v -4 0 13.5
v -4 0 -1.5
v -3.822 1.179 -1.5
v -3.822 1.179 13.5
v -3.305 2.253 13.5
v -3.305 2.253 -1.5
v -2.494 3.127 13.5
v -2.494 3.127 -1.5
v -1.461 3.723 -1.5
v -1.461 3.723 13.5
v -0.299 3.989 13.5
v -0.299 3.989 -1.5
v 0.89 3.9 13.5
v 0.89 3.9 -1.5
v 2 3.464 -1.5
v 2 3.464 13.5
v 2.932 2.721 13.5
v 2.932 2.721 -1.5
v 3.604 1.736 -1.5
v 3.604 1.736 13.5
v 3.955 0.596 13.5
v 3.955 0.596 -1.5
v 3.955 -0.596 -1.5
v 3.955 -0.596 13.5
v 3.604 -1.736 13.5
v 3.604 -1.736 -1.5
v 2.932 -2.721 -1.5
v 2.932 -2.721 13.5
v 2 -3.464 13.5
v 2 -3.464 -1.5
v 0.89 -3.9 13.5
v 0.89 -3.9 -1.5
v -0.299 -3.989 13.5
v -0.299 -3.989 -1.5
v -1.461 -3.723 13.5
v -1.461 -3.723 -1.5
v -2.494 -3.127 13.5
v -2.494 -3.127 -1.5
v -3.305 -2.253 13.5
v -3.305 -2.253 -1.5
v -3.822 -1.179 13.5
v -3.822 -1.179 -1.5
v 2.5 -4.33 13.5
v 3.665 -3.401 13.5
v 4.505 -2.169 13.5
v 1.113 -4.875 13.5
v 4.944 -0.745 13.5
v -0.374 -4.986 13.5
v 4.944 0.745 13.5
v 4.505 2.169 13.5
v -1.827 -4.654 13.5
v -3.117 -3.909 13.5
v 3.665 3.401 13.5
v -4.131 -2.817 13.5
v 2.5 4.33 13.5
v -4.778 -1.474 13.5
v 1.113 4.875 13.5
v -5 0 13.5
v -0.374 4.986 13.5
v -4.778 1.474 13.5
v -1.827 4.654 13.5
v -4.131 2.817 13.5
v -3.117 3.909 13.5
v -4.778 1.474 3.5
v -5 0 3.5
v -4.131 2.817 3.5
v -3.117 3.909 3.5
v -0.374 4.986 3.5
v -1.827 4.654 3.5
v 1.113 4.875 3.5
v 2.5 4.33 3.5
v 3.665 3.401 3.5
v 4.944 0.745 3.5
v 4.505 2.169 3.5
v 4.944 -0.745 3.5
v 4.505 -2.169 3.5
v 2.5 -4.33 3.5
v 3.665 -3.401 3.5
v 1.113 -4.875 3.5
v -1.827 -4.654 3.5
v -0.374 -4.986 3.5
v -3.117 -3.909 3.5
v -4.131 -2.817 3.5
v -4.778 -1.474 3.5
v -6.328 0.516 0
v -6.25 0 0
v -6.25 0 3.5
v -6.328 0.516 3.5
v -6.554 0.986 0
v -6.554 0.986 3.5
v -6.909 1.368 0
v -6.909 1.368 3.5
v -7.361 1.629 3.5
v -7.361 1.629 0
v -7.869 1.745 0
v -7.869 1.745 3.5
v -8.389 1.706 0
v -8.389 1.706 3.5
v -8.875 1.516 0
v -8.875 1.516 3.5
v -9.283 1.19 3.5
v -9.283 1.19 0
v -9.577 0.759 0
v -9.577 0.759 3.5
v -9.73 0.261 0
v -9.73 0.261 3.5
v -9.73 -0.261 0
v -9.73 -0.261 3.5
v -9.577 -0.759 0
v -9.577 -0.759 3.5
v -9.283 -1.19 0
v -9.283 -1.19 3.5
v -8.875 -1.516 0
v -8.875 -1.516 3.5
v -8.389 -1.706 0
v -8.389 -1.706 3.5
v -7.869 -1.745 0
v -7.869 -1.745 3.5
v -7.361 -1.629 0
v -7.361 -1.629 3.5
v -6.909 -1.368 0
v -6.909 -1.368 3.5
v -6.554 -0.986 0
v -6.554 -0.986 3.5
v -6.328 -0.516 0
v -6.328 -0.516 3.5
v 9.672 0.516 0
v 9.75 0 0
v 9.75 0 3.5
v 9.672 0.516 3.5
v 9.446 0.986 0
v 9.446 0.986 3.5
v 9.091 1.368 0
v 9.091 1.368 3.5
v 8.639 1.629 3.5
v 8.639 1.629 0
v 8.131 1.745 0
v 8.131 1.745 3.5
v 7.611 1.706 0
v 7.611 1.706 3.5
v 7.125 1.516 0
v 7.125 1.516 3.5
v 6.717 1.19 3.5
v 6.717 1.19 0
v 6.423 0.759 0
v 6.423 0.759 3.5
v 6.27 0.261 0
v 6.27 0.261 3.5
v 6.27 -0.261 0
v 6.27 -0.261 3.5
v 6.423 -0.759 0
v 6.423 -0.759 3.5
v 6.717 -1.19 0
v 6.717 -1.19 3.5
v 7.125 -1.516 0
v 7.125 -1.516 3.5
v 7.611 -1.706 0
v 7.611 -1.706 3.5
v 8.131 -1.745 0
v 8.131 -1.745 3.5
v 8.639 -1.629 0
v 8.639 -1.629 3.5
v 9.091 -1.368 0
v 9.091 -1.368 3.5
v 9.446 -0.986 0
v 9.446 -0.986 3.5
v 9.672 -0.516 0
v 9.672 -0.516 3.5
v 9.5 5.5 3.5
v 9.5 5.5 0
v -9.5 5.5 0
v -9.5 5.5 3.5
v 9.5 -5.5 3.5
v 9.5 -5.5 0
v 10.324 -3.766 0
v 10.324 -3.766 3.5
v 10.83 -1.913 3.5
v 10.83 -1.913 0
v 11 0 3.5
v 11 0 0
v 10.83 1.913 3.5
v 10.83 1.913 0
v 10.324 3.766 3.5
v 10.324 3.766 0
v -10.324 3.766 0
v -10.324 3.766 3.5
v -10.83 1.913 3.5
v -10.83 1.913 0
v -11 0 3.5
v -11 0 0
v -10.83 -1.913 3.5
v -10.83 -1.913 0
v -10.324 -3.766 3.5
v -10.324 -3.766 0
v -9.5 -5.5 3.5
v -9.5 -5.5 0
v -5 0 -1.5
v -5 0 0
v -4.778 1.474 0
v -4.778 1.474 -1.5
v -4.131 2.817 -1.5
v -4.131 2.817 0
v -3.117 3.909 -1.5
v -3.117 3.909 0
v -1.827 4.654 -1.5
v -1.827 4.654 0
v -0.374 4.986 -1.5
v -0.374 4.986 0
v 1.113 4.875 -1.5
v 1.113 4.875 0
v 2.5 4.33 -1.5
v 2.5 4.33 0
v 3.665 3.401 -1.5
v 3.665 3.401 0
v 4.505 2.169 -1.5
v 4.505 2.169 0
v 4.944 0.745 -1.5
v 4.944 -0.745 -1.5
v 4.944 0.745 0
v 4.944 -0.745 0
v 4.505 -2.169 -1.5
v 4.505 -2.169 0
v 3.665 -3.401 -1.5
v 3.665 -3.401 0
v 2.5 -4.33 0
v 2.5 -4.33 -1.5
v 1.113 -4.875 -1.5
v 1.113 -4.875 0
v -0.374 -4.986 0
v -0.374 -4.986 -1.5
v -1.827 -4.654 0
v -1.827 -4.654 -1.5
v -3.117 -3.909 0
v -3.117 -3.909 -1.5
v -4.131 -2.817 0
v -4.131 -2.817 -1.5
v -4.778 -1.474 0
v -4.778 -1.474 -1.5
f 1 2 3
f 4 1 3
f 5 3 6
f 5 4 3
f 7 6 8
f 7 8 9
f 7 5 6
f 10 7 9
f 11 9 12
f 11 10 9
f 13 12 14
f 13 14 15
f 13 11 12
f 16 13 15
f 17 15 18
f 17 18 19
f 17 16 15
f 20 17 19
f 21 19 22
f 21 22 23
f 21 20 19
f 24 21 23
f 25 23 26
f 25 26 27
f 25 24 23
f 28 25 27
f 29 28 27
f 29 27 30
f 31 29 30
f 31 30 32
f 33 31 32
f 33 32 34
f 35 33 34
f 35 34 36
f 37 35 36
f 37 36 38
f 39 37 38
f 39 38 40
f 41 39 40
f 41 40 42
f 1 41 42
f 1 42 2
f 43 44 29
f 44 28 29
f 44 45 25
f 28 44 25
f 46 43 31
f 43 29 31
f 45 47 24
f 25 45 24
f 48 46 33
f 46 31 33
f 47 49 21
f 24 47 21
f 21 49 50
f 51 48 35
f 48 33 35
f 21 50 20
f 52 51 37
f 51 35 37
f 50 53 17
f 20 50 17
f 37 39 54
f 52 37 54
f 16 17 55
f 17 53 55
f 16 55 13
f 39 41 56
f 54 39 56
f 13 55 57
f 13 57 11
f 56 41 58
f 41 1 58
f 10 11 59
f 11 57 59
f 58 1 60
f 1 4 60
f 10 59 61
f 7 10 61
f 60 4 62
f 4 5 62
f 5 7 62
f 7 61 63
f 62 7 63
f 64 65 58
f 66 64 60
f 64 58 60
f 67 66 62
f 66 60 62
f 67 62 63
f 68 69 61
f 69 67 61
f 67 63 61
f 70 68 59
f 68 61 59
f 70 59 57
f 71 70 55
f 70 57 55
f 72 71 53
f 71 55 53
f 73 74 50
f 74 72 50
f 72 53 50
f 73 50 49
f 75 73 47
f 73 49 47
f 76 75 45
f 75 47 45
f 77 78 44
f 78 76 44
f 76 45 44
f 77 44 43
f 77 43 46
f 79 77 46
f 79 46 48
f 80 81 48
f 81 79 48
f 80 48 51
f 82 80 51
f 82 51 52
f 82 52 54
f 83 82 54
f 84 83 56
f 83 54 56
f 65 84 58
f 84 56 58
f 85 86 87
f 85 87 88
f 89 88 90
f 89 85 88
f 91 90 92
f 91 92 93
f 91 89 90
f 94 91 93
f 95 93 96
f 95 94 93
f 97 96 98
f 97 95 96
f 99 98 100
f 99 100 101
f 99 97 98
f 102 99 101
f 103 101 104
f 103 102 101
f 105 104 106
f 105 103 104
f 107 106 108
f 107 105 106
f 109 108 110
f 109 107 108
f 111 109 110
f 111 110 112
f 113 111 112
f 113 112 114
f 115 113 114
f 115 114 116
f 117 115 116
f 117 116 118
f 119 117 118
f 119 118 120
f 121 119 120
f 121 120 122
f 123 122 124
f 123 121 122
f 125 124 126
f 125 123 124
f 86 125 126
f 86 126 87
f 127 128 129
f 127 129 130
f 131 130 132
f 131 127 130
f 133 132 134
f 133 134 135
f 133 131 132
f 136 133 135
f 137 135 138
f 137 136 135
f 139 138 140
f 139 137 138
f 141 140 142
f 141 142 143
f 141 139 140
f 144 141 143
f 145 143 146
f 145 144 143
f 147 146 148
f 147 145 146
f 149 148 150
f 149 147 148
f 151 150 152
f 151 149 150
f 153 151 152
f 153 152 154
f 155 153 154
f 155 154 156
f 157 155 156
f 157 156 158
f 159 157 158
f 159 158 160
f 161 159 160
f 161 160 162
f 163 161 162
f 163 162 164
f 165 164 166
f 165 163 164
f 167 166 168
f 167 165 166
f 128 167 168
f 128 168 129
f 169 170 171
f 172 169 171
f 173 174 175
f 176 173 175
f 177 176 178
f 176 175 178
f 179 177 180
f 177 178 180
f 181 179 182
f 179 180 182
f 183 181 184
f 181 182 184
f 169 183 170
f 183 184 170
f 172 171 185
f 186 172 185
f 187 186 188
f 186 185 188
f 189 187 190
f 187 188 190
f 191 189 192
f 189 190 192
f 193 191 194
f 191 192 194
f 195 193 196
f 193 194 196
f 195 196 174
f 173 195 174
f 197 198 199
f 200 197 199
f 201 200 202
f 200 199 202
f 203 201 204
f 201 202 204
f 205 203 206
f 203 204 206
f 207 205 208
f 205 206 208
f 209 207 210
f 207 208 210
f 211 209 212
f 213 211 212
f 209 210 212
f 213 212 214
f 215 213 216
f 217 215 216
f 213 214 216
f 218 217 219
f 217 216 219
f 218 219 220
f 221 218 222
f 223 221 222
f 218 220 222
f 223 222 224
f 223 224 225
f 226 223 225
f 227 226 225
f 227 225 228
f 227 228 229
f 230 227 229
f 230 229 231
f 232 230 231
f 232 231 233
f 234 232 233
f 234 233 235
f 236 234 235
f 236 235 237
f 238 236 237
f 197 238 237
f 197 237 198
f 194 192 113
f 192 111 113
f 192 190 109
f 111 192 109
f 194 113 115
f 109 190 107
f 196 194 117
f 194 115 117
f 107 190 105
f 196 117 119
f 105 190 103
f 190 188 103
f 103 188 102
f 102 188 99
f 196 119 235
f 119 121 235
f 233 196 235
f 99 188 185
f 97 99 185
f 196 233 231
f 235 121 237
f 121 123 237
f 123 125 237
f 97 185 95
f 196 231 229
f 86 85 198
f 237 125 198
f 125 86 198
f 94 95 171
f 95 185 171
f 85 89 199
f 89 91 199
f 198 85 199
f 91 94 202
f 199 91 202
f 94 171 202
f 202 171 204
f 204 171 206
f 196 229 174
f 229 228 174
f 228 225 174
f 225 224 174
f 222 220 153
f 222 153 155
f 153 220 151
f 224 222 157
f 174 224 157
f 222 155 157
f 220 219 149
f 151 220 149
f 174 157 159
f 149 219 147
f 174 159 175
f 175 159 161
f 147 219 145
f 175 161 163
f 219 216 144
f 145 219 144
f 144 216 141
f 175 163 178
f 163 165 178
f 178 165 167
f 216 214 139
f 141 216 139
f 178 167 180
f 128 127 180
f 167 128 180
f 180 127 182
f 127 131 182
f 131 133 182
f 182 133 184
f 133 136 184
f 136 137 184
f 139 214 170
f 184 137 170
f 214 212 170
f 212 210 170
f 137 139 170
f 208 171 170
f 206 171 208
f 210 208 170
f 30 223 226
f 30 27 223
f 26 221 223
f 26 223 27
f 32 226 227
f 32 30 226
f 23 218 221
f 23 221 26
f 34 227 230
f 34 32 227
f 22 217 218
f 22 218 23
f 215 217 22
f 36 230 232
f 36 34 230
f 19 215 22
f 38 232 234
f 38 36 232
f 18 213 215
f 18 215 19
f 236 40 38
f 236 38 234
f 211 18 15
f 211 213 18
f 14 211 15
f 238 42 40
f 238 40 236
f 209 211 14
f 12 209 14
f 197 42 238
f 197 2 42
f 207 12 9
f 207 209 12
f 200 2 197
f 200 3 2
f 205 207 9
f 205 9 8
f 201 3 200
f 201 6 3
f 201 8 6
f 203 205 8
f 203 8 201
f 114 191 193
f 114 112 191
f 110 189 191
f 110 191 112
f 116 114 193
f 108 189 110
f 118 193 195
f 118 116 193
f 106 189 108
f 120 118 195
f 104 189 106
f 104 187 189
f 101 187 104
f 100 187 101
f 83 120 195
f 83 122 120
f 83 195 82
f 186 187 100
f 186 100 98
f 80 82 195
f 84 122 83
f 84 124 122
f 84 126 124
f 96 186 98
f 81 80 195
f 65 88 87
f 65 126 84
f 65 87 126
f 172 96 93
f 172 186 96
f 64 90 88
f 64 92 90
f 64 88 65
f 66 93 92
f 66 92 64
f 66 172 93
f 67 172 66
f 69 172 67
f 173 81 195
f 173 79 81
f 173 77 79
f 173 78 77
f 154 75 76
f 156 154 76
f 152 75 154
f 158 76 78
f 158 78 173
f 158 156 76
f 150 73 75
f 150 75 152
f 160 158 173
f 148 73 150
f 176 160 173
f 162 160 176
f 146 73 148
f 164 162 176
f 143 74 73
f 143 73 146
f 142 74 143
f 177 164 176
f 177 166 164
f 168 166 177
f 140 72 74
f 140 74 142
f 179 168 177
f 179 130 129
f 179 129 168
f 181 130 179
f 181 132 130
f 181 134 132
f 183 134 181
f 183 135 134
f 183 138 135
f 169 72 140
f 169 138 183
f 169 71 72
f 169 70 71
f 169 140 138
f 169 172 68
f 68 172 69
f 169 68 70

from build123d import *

# Parameters (mm, degrees)
SKETCH_1_R           = 1.75
EXTRUDE_1_DEPTH      = 3.5
EXTRUDE_2_DEPTH      = 1.5
EXTRUDE_2_DEPTH_BACK = 13.5
SKETCH_2_R           = 5
SKETCH_2_R_2         = 4
SKETCH_3_R           = 4
CUT_EXTRUDE_1_DEPTH  = 78.5


with BuildPart() as part:
    # 草图1 → 凸台-拉伸1 (new body)
    with BuildSketch(Plane.XY):
        with BuildLine():
            Line((-9.5, -5.5), (9.5, -5.5))
            ThreePointArc((9.5, -5.5), (11, 0), (9.5, 5.5))
            Line((9.5, 5.5), (-9.5, 5.5))
            ThreePointArc((-9.5, 5.5), (-11, 0), (-9.5, -5.5))
        make_face()
        with Locations((8, 0)):
            Circle(SKETCH_1_R, mode=Mode.SUBTRACT)
        with Locations((-8, 0)):
            Circle(SKETCH_1_R, mode=Mode.SUBTRACT)
    extrude(amount=EXTRUDE_1_DEPTH)

    # 草图2 → 凸台-拉伸2 (add, two sides: drawn at the far end of the back side and taken through both)
    with BuildSketch(Plane(origin=(0, 0, 0), x_dir=(-1, 0, 0), z_dir=(0, 0, -1)).offset(-EXTRUDE_2_DEPTH_BACK)):
        Circle(SKETCH_2_R)
        Circle(SKETCH_2_R_2, mode=Mode.SUBTRACT)
    extrude(amount=EXTRUDE_2_DEPTH + EXTRUDE_2_DEPTH_BACK)

    # 草图3 → 切除-拉伸1 (cut)
    with BuildSketch(Plane(origin=(0, 0, 0), x_dir=(-1, 0, 0), z_dir=(0, 0, -1))):
        Circle(SKETCH_3_R)
    extrude(amount=-CUT_EXTRUDE_1_DEPTH, mode=Mode.SUBTRACT)


solid = part.part
